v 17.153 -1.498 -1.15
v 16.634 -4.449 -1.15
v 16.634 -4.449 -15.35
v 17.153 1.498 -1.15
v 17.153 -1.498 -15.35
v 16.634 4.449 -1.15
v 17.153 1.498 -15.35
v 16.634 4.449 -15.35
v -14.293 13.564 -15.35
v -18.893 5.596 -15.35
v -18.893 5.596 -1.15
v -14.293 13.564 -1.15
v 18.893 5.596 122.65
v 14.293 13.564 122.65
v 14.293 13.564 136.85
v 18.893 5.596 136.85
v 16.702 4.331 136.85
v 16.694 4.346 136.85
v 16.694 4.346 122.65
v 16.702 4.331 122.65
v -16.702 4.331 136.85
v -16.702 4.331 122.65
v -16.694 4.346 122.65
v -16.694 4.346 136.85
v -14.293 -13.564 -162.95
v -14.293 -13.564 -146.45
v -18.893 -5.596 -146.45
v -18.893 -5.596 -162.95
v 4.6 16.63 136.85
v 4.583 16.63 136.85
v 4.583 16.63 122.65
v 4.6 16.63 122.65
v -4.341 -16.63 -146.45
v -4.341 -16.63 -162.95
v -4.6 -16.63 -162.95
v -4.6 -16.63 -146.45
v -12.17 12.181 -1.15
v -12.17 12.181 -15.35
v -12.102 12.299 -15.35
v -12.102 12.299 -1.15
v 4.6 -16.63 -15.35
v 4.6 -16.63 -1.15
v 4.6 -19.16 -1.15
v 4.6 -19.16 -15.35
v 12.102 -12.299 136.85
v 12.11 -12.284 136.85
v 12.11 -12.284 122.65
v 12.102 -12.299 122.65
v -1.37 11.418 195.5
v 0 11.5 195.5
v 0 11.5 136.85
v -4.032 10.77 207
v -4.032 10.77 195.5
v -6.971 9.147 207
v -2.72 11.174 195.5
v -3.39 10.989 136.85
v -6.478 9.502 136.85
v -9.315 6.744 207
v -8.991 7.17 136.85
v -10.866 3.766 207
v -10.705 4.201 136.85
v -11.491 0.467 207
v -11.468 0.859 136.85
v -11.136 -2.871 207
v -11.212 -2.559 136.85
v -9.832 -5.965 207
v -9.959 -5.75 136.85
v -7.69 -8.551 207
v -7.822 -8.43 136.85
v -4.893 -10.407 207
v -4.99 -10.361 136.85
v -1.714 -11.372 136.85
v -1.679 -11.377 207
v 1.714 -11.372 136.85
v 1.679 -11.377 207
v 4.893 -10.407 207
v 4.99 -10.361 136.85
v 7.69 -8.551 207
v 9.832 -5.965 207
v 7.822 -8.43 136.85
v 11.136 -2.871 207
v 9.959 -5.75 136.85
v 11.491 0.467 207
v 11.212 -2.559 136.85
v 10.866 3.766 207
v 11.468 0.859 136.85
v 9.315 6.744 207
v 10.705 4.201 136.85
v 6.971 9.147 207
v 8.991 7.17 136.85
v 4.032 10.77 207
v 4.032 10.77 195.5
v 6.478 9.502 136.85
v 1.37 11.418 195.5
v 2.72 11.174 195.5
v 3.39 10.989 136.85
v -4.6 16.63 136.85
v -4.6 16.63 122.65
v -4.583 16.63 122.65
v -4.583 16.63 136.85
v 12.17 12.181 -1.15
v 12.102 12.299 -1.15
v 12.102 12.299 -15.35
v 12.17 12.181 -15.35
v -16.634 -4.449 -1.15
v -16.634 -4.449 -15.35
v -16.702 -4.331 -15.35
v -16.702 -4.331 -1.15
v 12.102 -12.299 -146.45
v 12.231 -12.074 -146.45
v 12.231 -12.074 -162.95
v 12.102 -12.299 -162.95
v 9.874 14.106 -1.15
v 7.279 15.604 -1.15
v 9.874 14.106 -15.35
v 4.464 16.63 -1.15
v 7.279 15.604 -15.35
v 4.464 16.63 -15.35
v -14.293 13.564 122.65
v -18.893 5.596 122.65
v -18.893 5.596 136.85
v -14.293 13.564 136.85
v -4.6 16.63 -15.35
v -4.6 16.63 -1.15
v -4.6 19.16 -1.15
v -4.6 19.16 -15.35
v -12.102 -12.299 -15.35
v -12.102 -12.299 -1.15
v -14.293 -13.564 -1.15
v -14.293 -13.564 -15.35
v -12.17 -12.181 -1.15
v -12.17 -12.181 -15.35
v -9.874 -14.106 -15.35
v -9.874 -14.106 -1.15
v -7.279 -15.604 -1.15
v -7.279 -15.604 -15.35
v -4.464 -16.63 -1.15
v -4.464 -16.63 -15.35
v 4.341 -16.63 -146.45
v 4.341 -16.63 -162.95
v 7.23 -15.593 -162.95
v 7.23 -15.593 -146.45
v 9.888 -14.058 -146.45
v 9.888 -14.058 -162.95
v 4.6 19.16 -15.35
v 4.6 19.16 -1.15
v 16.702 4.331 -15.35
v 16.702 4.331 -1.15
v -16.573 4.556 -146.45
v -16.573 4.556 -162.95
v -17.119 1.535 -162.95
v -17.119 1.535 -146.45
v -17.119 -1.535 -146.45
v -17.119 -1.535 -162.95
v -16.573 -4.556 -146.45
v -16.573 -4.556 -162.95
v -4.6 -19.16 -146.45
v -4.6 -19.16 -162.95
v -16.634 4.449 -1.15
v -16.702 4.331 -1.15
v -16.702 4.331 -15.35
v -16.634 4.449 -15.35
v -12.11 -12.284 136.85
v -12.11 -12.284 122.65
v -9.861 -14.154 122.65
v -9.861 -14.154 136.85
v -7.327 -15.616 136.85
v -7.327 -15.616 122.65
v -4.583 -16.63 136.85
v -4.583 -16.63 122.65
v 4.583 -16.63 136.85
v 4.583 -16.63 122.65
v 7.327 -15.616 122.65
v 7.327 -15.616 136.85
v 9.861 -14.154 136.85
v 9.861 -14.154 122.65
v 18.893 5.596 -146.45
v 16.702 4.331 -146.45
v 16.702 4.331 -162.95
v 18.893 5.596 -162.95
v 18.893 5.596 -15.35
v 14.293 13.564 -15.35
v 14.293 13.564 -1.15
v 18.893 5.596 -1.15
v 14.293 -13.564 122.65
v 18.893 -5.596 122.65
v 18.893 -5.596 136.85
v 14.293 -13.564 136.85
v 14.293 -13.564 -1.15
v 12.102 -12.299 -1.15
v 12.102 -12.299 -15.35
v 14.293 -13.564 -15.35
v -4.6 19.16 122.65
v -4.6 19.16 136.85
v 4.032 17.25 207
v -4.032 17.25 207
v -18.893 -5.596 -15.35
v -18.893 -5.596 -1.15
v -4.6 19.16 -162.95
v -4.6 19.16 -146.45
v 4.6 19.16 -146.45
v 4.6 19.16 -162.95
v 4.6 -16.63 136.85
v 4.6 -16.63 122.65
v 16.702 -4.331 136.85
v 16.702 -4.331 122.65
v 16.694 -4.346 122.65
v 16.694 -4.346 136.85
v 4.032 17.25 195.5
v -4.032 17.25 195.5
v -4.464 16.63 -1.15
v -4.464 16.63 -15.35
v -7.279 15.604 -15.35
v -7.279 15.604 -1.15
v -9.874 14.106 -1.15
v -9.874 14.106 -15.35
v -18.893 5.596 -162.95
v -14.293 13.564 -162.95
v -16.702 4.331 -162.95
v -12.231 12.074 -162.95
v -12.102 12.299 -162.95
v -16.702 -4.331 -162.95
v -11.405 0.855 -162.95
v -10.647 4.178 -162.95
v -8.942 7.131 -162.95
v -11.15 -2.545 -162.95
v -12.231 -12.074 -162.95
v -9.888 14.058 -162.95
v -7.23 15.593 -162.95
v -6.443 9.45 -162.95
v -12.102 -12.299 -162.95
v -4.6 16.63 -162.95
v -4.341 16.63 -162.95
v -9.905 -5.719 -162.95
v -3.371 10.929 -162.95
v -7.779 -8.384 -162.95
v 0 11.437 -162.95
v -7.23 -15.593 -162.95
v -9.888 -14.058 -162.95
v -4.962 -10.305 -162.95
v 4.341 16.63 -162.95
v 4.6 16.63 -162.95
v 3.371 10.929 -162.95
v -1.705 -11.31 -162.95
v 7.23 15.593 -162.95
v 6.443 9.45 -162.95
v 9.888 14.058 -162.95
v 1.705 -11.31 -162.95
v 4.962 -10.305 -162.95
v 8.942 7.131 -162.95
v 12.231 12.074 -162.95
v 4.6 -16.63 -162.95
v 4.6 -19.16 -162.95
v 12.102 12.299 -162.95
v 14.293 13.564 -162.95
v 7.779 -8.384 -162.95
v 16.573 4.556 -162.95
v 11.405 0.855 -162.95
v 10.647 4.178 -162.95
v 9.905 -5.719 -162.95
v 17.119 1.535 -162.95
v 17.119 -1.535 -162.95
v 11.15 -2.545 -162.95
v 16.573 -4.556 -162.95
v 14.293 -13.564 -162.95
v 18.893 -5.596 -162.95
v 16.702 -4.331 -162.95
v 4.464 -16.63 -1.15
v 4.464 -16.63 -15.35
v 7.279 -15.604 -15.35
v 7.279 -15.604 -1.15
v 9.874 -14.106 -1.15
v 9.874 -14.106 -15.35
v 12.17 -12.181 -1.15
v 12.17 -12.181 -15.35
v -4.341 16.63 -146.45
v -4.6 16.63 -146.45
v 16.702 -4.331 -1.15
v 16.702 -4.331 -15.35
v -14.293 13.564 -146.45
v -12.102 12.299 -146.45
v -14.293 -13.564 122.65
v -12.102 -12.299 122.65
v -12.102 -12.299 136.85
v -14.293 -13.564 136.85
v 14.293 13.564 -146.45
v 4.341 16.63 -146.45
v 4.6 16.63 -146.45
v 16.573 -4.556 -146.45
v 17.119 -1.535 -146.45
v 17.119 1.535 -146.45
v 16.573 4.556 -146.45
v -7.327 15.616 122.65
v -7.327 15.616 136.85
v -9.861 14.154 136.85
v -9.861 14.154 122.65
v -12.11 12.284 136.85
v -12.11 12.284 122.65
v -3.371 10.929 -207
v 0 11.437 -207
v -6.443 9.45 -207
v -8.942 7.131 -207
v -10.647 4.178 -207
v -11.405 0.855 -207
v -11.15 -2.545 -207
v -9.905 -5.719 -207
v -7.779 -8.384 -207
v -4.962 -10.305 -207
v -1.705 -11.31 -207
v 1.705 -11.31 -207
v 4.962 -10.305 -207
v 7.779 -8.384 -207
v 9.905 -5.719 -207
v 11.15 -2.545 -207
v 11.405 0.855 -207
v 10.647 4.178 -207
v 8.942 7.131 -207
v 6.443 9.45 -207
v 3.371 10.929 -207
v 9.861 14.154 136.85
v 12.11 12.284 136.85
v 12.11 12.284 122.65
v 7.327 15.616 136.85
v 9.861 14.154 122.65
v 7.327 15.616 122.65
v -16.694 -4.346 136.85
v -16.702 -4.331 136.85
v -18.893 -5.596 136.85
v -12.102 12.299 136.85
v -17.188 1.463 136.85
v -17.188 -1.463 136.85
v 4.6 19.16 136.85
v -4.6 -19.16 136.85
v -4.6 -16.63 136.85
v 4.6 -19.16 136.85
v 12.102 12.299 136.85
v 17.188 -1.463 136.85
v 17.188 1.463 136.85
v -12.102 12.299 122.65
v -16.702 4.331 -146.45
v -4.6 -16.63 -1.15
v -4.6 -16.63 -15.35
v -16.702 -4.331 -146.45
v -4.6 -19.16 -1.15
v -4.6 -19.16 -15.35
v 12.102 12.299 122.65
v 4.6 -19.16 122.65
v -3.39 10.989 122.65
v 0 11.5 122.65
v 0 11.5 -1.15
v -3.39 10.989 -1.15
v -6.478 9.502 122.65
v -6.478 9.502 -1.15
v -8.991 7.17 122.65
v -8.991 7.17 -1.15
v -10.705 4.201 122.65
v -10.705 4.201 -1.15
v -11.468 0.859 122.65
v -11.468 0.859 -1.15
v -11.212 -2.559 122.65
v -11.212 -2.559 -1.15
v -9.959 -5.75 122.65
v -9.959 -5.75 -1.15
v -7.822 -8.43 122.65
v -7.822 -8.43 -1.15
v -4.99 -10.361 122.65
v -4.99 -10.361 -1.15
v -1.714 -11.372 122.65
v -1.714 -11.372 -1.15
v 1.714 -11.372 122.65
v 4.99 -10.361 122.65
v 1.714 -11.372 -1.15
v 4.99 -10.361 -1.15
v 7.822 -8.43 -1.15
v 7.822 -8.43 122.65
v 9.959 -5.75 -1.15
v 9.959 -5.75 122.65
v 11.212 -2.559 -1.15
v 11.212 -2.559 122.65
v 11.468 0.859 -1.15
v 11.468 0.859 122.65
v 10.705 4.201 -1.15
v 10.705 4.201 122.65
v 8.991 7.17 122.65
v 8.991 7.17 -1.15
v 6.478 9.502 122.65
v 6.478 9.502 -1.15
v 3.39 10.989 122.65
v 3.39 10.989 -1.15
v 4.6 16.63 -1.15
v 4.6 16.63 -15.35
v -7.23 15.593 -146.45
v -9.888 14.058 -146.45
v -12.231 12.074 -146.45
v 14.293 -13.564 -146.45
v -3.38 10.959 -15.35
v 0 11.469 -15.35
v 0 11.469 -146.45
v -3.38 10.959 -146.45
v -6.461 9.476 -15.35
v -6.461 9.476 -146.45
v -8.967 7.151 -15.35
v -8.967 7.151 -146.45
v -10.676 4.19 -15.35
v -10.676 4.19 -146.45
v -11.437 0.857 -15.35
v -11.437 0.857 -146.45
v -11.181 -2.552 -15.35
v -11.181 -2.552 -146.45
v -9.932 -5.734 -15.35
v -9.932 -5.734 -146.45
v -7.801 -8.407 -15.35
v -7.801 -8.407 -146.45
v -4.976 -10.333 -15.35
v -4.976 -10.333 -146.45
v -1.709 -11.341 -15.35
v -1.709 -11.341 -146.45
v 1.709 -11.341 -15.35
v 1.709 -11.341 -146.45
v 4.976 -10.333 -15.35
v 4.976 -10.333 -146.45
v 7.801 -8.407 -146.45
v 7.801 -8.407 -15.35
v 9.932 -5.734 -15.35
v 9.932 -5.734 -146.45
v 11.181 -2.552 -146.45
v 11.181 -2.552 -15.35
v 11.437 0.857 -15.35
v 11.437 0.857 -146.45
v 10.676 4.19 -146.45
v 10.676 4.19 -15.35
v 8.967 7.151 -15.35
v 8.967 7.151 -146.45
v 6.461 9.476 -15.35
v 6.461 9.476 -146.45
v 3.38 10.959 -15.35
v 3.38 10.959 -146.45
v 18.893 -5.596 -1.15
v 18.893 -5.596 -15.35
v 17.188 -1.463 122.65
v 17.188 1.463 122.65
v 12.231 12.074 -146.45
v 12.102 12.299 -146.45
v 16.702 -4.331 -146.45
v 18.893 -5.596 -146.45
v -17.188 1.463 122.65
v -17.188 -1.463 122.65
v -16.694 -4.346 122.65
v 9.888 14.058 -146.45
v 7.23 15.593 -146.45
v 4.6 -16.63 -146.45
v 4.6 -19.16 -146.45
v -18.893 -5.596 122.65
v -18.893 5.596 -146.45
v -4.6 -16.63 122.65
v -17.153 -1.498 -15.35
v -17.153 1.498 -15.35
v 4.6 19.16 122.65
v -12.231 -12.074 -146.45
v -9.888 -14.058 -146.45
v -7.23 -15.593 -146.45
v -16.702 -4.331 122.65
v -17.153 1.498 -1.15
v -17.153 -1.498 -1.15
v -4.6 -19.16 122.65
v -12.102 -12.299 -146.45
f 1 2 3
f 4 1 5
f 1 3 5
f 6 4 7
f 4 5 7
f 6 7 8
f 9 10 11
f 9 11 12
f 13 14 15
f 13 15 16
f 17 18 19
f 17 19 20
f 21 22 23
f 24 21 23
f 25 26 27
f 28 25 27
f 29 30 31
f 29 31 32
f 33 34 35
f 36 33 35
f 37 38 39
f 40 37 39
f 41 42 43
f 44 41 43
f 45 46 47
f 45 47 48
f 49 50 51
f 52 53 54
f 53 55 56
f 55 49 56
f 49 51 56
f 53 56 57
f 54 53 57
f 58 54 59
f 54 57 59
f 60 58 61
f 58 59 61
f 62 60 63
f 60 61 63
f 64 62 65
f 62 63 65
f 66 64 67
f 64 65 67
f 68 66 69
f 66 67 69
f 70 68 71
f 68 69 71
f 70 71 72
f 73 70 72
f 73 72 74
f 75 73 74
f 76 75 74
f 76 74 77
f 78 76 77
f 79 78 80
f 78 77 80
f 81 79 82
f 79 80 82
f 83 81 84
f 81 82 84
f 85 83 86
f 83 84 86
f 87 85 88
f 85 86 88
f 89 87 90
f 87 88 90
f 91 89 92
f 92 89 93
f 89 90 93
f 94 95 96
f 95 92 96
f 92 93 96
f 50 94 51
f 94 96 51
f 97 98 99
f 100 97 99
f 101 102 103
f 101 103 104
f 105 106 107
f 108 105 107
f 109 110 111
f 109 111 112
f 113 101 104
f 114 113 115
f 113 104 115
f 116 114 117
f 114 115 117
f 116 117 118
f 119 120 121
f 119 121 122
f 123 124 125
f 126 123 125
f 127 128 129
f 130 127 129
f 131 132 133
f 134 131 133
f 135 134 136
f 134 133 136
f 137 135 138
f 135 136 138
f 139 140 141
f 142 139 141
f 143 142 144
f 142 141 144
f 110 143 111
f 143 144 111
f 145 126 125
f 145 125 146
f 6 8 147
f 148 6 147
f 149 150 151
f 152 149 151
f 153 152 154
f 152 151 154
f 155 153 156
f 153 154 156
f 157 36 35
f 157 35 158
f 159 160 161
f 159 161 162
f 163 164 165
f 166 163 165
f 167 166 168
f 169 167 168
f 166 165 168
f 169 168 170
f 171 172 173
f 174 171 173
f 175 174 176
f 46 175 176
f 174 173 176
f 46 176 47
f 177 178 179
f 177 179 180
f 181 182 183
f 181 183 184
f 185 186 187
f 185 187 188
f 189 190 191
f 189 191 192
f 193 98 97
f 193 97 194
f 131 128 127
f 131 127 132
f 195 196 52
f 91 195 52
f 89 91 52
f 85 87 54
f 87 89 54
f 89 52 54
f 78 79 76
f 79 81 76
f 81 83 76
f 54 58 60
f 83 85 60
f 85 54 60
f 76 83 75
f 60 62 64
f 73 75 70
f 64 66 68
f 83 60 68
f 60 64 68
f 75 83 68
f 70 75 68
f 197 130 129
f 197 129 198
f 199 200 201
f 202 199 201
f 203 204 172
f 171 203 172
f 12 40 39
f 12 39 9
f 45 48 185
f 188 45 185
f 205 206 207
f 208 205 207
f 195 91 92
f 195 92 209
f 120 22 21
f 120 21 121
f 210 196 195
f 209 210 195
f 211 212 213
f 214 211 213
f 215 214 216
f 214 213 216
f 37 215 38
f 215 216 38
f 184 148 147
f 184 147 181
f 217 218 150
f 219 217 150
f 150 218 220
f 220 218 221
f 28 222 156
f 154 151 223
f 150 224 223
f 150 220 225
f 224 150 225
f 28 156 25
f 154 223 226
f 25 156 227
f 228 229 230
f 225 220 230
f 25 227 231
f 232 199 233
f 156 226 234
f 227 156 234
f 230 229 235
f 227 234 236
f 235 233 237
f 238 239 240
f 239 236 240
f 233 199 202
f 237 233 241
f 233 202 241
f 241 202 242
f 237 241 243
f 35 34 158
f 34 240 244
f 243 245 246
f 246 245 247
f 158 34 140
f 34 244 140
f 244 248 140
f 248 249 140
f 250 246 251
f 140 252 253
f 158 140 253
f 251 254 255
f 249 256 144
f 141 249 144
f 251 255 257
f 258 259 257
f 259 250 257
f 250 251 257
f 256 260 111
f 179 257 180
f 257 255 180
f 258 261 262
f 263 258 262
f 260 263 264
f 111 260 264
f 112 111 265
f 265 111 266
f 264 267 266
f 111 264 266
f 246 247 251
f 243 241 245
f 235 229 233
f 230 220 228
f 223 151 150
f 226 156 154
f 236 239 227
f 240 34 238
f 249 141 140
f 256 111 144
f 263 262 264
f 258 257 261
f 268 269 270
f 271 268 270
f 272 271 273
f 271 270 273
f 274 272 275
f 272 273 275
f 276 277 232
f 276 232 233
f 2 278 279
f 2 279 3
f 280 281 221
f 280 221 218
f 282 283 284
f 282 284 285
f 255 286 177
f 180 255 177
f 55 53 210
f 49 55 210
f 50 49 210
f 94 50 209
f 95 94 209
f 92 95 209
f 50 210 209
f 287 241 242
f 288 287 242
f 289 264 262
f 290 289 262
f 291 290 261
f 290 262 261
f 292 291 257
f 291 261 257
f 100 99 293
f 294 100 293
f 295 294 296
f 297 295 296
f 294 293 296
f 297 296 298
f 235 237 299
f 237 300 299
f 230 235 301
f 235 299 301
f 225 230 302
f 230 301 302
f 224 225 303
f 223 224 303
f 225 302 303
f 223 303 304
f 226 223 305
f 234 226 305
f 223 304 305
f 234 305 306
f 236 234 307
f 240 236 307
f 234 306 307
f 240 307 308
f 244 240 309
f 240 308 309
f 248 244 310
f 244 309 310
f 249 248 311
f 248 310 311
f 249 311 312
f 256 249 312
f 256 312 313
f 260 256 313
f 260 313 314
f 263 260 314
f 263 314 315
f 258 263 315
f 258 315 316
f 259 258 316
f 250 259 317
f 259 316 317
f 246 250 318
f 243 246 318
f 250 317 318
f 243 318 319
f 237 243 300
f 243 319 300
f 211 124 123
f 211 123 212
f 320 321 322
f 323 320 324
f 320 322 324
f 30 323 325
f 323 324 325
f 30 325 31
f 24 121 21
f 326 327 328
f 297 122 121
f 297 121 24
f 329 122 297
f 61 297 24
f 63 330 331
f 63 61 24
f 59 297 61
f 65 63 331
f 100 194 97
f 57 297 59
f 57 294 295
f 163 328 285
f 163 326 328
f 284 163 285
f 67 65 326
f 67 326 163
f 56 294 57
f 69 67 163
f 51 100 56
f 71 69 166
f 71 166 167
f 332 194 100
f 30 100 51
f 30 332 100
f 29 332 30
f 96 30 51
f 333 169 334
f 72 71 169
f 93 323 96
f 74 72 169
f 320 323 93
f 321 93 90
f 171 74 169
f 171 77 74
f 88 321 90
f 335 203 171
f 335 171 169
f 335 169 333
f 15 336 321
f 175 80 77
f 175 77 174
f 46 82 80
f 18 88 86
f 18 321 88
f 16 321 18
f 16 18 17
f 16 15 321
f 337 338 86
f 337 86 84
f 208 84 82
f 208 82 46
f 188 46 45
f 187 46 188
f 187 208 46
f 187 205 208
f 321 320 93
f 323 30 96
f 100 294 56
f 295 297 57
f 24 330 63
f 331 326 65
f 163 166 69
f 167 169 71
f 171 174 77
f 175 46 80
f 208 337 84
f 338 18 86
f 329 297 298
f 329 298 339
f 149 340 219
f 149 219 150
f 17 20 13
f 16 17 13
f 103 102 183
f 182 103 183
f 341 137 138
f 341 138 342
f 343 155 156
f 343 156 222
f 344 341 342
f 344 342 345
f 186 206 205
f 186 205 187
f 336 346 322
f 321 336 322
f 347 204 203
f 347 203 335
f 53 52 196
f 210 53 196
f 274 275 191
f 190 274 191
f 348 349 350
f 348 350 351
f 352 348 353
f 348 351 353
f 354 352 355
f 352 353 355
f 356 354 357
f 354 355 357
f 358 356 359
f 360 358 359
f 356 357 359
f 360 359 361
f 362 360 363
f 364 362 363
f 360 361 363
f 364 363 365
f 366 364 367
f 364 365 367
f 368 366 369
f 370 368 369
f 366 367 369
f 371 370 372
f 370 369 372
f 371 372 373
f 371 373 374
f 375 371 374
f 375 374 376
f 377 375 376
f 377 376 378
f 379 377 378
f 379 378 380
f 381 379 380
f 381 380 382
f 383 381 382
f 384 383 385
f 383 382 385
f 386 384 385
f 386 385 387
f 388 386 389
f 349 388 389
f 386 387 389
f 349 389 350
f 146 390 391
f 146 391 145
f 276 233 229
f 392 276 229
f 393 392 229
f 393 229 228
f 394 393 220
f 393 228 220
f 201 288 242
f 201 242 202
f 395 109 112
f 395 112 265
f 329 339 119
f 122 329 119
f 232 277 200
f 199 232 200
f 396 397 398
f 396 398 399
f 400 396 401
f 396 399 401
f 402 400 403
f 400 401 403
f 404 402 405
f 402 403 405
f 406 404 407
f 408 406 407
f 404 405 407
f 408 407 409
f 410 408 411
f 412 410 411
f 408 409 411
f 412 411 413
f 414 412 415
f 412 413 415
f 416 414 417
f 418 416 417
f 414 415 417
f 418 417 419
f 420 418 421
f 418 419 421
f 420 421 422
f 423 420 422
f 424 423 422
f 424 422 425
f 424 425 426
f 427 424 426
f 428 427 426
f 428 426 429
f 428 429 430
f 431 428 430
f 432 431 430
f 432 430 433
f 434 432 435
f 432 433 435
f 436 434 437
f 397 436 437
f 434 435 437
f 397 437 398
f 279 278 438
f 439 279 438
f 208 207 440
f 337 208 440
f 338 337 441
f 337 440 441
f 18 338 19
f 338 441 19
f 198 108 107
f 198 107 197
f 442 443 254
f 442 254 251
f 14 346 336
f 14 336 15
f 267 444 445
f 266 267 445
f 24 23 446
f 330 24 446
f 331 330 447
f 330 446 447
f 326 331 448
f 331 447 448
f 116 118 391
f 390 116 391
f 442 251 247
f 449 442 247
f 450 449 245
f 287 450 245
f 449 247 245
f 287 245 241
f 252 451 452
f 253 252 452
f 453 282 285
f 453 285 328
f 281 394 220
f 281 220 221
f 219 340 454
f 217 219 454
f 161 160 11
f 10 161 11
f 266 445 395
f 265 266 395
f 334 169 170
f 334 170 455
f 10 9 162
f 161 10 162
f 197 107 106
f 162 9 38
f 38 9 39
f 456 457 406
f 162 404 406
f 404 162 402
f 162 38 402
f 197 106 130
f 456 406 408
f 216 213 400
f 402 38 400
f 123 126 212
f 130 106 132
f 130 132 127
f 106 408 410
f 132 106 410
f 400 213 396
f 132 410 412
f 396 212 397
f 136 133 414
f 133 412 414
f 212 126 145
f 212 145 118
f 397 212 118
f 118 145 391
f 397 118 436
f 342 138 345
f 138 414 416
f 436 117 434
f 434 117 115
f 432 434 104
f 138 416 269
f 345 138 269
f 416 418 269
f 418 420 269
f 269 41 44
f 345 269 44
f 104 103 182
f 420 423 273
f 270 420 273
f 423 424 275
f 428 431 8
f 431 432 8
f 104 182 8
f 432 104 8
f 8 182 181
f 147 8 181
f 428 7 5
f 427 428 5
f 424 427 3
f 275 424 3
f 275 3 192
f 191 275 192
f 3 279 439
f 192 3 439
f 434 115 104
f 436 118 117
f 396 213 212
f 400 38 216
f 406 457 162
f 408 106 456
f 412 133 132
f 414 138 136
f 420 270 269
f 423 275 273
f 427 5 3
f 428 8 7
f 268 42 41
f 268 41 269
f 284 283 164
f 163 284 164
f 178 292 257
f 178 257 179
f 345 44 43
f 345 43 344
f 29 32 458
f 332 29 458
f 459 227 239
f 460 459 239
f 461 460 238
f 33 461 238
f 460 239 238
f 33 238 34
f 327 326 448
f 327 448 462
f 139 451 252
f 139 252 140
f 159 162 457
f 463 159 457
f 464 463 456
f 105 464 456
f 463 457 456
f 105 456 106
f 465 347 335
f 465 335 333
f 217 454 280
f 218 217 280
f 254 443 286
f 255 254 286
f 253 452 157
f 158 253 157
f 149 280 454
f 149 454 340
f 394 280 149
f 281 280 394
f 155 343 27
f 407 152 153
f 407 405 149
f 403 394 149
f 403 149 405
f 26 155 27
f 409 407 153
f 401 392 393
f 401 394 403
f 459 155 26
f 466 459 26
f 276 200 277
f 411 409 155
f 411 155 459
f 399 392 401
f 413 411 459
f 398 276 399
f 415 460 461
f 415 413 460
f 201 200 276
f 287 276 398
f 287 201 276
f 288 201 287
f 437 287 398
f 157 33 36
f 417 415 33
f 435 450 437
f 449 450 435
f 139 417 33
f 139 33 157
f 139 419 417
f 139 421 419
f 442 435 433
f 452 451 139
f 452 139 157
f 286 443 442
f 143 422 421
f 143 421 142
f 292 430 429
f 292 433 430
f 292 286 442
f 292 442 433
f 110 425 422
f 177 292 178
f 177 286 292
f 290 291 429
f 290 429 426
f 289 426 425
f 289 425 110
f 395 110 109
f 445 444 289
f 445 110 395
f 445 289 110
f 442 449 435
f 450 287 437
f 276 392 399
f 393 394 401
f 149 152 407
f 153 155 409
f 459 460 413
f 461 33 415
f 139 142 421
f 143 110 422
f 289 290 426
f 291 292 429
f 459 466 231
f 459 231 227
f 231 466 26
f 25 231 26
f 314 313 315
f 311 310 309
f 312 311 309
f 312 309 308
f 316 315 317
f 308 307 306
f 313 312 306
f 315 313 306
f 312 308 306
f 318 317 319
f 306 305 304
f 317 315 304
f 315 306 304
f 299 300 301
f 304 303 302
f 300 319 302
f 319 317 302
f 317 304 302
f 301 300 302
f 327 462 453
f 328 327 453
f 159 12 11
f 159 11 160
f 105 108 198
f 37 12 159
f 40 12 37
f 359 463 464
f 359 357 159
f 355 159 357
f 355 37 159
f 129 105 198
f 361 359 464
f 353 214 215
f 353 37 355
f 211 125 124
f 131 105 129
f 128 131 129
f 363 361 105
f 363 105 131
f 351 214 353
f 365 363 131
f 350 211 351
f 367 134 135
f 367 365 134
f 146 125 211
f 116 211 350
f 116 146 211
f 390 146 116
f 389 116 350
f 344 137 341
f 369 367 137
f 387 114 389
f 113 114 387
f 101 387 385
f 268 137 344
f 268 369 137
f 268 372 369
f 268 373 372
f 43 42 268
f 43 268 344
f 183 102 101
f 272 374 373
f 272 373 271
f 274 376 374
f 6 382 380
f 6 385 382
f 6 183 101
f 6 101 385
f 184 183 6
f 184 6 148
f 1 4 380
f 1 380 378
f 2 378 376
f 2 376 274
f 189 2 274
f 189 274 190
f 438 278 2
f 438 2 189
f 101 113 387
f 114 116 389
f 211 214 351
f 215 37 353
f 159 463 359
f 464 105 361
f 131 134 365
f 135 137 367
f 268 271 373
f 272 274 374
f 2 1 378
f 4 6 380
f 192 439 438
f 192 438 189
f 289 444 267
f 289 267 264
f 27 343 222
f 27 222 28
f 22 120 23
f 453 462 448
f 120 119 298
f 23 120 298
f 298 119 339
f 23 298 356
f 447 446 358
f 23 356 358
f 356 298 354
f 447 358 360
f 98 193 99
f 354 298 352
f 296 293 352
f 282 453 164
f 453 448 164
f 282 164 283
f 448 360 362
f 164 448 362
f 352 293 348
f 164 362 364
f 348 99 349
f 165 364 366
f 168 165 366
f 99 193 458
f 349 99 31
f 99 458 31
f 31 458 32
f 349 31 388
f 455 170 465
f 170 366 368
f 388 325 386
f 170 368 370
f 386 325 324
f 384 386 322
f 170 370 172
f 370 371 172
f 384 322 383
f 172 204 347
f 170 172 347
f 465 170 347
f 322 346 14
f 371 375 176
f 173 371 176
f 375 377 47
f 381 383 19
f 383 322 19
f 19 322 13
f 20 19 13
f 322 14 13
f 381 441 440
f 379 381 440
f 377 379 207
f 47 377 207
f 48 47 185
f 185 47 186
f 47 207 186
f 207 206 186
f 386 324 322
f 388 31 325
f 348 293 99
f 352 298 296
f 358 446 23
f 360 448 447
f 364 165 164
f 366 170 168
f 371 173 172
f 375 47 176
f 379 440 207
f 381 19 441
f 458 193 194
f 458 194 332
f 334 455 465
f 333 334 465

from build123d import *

# Parameters (mm, degrees)
BOSS_EXTRUDE2_START = 136.85
SKETCH4_W           = 9.2
SKETCH4_H           = 2.53
BOSS_EXTRUDE2_DEPTH = 14.2
BOSS_EXTRUDE3_START = -1.15
SKETCH4_2_W         = 9.2
SKETCH4_2_H         = 2.53
BOSS_EXTRUDE3_DEPTH = 14.2
BOSS_EXTRUDE4_START = -146.45
SKETCH4_3_W         = 9.2
SKETCH4_3_H         = 2.53
BOSS_EXTRUDE4_DEPTH = 16.5
CIRPATTERN1_COUNT   = 6
CIRPATTERN2_COUNT   = 6
CIRPATTERN3_COUNT   = 6
BOSS_EXTRUDE5_START = 207
SKETCH5_W           = 8.064124356
SKETCH5_H           = 11.5
BOSS_EXTRUDE5_DEPTH = 11.5


with BuildPart() as part:
    # Sketch3 → Revolve1 (revolve)
    with BuildSketch(Plane(origin=(0, 0, 0), x_dir=(0, 0, -1), z_dir=(1, 0, 0))):
        Polygon((-207, 11.5), (-136.85, 11.5), (-136.85, 17.25), (-122.65, 17.25), (-122.65, 11.5), (1.15, 11.5), (1.15, 17.218622442), (15.35, 17.218622442), (15.35, 11.468622442), (146.45, 11.468622442), (146.45, 17.187244885), (162.95, 17.187244885), (162.95, 11.437244885), (207, 11.437244885), (207, 0), (-207, 0), align=None)
    revolve(axis=Axis((0, 0, -207), (0, 0, 1)))

    # Sketch4 → Boss-Extrude2 (add)
    with BuildSketch(Plane.XY.offset(BOSS_EXTRUDE2_START)):
        with Locations((0, 17.895)):
            Rectangle(SKETCH4_W, SKETCH4_H)
    boss_extrude2 = extrude(amount=-BOSS_EXTRUDE2_DEPTH)

    # Sketch4<2> → Boss-Extrude3 (add)
    with BuildSketch(Plane.XY.offset(BOSS_EXTRUDE3_START)):
        with Locations((0, 17.895)):
            Rectangle(SKETCH4_2_W, SKETCH4_2_H)
    boss_extrude3 = extrude(amount=-BOSS_EXTRUDE3_DEPTH)

    # Sketch4<3> → Boss-Extrude4 (add)
    with BuildSketch(Plane.XY.offset(BOSS_EXTRUDE4_START)):
        with Locations((0, 17.895)):
            Rectangle(SKETCH4_3_W, SKETCH4_3_H)
    boss_extrude4 = extrude(amount=-BOSS_EXTRUDE4_DEPTH)

    # CirPattern1: Boss-Extrude3 ×6 about axis
    cirpattern1_axis = Axis((0, 0, 0), (0, 0, 1))
    for i in range(1, CIRPATTERN1_COUNT):
        add(boss_extrude3.rotate(cirpattern1_axis, i * 360 / CIRPATTERN1_COUNT))

    # CirPattern2: Boss-Extrude2 ×6 about axis
    cirpattern2_axis = Axis((0, 0, 0), (0, 0, 1))
    for i in range(1, CIRPATTERN2_COUNT):
        add(boss_extrude2.rotate(cirpattern2_axis, i * 360 / CIRPATTERN2_COUNT))

    # CirPattern3: Boss-Extrude4 ×6 about axis
    cirpattern3_axis = Axis((0, 0, 0), (0, 0, 1))
    for i in range(1, CIRPATTERN3_COUNT):
        add(boss_extrude4.rotate(cirpattern3_axis, i * 360 / CIRPATTERN3_COUNT))

    # Sketch5 → Boss-Extrude5 (add)
    with BuildSketch(Plane.XY.offset(BOSS_EXTRUDE5_START)):
        with Locations((0, 11.5)):
            Rectangle(SKETCH5_W, SKETCH5_H)
    extrude(amount=-BOSS_EXTRUDE5_DEPTH)


solid = part.part
